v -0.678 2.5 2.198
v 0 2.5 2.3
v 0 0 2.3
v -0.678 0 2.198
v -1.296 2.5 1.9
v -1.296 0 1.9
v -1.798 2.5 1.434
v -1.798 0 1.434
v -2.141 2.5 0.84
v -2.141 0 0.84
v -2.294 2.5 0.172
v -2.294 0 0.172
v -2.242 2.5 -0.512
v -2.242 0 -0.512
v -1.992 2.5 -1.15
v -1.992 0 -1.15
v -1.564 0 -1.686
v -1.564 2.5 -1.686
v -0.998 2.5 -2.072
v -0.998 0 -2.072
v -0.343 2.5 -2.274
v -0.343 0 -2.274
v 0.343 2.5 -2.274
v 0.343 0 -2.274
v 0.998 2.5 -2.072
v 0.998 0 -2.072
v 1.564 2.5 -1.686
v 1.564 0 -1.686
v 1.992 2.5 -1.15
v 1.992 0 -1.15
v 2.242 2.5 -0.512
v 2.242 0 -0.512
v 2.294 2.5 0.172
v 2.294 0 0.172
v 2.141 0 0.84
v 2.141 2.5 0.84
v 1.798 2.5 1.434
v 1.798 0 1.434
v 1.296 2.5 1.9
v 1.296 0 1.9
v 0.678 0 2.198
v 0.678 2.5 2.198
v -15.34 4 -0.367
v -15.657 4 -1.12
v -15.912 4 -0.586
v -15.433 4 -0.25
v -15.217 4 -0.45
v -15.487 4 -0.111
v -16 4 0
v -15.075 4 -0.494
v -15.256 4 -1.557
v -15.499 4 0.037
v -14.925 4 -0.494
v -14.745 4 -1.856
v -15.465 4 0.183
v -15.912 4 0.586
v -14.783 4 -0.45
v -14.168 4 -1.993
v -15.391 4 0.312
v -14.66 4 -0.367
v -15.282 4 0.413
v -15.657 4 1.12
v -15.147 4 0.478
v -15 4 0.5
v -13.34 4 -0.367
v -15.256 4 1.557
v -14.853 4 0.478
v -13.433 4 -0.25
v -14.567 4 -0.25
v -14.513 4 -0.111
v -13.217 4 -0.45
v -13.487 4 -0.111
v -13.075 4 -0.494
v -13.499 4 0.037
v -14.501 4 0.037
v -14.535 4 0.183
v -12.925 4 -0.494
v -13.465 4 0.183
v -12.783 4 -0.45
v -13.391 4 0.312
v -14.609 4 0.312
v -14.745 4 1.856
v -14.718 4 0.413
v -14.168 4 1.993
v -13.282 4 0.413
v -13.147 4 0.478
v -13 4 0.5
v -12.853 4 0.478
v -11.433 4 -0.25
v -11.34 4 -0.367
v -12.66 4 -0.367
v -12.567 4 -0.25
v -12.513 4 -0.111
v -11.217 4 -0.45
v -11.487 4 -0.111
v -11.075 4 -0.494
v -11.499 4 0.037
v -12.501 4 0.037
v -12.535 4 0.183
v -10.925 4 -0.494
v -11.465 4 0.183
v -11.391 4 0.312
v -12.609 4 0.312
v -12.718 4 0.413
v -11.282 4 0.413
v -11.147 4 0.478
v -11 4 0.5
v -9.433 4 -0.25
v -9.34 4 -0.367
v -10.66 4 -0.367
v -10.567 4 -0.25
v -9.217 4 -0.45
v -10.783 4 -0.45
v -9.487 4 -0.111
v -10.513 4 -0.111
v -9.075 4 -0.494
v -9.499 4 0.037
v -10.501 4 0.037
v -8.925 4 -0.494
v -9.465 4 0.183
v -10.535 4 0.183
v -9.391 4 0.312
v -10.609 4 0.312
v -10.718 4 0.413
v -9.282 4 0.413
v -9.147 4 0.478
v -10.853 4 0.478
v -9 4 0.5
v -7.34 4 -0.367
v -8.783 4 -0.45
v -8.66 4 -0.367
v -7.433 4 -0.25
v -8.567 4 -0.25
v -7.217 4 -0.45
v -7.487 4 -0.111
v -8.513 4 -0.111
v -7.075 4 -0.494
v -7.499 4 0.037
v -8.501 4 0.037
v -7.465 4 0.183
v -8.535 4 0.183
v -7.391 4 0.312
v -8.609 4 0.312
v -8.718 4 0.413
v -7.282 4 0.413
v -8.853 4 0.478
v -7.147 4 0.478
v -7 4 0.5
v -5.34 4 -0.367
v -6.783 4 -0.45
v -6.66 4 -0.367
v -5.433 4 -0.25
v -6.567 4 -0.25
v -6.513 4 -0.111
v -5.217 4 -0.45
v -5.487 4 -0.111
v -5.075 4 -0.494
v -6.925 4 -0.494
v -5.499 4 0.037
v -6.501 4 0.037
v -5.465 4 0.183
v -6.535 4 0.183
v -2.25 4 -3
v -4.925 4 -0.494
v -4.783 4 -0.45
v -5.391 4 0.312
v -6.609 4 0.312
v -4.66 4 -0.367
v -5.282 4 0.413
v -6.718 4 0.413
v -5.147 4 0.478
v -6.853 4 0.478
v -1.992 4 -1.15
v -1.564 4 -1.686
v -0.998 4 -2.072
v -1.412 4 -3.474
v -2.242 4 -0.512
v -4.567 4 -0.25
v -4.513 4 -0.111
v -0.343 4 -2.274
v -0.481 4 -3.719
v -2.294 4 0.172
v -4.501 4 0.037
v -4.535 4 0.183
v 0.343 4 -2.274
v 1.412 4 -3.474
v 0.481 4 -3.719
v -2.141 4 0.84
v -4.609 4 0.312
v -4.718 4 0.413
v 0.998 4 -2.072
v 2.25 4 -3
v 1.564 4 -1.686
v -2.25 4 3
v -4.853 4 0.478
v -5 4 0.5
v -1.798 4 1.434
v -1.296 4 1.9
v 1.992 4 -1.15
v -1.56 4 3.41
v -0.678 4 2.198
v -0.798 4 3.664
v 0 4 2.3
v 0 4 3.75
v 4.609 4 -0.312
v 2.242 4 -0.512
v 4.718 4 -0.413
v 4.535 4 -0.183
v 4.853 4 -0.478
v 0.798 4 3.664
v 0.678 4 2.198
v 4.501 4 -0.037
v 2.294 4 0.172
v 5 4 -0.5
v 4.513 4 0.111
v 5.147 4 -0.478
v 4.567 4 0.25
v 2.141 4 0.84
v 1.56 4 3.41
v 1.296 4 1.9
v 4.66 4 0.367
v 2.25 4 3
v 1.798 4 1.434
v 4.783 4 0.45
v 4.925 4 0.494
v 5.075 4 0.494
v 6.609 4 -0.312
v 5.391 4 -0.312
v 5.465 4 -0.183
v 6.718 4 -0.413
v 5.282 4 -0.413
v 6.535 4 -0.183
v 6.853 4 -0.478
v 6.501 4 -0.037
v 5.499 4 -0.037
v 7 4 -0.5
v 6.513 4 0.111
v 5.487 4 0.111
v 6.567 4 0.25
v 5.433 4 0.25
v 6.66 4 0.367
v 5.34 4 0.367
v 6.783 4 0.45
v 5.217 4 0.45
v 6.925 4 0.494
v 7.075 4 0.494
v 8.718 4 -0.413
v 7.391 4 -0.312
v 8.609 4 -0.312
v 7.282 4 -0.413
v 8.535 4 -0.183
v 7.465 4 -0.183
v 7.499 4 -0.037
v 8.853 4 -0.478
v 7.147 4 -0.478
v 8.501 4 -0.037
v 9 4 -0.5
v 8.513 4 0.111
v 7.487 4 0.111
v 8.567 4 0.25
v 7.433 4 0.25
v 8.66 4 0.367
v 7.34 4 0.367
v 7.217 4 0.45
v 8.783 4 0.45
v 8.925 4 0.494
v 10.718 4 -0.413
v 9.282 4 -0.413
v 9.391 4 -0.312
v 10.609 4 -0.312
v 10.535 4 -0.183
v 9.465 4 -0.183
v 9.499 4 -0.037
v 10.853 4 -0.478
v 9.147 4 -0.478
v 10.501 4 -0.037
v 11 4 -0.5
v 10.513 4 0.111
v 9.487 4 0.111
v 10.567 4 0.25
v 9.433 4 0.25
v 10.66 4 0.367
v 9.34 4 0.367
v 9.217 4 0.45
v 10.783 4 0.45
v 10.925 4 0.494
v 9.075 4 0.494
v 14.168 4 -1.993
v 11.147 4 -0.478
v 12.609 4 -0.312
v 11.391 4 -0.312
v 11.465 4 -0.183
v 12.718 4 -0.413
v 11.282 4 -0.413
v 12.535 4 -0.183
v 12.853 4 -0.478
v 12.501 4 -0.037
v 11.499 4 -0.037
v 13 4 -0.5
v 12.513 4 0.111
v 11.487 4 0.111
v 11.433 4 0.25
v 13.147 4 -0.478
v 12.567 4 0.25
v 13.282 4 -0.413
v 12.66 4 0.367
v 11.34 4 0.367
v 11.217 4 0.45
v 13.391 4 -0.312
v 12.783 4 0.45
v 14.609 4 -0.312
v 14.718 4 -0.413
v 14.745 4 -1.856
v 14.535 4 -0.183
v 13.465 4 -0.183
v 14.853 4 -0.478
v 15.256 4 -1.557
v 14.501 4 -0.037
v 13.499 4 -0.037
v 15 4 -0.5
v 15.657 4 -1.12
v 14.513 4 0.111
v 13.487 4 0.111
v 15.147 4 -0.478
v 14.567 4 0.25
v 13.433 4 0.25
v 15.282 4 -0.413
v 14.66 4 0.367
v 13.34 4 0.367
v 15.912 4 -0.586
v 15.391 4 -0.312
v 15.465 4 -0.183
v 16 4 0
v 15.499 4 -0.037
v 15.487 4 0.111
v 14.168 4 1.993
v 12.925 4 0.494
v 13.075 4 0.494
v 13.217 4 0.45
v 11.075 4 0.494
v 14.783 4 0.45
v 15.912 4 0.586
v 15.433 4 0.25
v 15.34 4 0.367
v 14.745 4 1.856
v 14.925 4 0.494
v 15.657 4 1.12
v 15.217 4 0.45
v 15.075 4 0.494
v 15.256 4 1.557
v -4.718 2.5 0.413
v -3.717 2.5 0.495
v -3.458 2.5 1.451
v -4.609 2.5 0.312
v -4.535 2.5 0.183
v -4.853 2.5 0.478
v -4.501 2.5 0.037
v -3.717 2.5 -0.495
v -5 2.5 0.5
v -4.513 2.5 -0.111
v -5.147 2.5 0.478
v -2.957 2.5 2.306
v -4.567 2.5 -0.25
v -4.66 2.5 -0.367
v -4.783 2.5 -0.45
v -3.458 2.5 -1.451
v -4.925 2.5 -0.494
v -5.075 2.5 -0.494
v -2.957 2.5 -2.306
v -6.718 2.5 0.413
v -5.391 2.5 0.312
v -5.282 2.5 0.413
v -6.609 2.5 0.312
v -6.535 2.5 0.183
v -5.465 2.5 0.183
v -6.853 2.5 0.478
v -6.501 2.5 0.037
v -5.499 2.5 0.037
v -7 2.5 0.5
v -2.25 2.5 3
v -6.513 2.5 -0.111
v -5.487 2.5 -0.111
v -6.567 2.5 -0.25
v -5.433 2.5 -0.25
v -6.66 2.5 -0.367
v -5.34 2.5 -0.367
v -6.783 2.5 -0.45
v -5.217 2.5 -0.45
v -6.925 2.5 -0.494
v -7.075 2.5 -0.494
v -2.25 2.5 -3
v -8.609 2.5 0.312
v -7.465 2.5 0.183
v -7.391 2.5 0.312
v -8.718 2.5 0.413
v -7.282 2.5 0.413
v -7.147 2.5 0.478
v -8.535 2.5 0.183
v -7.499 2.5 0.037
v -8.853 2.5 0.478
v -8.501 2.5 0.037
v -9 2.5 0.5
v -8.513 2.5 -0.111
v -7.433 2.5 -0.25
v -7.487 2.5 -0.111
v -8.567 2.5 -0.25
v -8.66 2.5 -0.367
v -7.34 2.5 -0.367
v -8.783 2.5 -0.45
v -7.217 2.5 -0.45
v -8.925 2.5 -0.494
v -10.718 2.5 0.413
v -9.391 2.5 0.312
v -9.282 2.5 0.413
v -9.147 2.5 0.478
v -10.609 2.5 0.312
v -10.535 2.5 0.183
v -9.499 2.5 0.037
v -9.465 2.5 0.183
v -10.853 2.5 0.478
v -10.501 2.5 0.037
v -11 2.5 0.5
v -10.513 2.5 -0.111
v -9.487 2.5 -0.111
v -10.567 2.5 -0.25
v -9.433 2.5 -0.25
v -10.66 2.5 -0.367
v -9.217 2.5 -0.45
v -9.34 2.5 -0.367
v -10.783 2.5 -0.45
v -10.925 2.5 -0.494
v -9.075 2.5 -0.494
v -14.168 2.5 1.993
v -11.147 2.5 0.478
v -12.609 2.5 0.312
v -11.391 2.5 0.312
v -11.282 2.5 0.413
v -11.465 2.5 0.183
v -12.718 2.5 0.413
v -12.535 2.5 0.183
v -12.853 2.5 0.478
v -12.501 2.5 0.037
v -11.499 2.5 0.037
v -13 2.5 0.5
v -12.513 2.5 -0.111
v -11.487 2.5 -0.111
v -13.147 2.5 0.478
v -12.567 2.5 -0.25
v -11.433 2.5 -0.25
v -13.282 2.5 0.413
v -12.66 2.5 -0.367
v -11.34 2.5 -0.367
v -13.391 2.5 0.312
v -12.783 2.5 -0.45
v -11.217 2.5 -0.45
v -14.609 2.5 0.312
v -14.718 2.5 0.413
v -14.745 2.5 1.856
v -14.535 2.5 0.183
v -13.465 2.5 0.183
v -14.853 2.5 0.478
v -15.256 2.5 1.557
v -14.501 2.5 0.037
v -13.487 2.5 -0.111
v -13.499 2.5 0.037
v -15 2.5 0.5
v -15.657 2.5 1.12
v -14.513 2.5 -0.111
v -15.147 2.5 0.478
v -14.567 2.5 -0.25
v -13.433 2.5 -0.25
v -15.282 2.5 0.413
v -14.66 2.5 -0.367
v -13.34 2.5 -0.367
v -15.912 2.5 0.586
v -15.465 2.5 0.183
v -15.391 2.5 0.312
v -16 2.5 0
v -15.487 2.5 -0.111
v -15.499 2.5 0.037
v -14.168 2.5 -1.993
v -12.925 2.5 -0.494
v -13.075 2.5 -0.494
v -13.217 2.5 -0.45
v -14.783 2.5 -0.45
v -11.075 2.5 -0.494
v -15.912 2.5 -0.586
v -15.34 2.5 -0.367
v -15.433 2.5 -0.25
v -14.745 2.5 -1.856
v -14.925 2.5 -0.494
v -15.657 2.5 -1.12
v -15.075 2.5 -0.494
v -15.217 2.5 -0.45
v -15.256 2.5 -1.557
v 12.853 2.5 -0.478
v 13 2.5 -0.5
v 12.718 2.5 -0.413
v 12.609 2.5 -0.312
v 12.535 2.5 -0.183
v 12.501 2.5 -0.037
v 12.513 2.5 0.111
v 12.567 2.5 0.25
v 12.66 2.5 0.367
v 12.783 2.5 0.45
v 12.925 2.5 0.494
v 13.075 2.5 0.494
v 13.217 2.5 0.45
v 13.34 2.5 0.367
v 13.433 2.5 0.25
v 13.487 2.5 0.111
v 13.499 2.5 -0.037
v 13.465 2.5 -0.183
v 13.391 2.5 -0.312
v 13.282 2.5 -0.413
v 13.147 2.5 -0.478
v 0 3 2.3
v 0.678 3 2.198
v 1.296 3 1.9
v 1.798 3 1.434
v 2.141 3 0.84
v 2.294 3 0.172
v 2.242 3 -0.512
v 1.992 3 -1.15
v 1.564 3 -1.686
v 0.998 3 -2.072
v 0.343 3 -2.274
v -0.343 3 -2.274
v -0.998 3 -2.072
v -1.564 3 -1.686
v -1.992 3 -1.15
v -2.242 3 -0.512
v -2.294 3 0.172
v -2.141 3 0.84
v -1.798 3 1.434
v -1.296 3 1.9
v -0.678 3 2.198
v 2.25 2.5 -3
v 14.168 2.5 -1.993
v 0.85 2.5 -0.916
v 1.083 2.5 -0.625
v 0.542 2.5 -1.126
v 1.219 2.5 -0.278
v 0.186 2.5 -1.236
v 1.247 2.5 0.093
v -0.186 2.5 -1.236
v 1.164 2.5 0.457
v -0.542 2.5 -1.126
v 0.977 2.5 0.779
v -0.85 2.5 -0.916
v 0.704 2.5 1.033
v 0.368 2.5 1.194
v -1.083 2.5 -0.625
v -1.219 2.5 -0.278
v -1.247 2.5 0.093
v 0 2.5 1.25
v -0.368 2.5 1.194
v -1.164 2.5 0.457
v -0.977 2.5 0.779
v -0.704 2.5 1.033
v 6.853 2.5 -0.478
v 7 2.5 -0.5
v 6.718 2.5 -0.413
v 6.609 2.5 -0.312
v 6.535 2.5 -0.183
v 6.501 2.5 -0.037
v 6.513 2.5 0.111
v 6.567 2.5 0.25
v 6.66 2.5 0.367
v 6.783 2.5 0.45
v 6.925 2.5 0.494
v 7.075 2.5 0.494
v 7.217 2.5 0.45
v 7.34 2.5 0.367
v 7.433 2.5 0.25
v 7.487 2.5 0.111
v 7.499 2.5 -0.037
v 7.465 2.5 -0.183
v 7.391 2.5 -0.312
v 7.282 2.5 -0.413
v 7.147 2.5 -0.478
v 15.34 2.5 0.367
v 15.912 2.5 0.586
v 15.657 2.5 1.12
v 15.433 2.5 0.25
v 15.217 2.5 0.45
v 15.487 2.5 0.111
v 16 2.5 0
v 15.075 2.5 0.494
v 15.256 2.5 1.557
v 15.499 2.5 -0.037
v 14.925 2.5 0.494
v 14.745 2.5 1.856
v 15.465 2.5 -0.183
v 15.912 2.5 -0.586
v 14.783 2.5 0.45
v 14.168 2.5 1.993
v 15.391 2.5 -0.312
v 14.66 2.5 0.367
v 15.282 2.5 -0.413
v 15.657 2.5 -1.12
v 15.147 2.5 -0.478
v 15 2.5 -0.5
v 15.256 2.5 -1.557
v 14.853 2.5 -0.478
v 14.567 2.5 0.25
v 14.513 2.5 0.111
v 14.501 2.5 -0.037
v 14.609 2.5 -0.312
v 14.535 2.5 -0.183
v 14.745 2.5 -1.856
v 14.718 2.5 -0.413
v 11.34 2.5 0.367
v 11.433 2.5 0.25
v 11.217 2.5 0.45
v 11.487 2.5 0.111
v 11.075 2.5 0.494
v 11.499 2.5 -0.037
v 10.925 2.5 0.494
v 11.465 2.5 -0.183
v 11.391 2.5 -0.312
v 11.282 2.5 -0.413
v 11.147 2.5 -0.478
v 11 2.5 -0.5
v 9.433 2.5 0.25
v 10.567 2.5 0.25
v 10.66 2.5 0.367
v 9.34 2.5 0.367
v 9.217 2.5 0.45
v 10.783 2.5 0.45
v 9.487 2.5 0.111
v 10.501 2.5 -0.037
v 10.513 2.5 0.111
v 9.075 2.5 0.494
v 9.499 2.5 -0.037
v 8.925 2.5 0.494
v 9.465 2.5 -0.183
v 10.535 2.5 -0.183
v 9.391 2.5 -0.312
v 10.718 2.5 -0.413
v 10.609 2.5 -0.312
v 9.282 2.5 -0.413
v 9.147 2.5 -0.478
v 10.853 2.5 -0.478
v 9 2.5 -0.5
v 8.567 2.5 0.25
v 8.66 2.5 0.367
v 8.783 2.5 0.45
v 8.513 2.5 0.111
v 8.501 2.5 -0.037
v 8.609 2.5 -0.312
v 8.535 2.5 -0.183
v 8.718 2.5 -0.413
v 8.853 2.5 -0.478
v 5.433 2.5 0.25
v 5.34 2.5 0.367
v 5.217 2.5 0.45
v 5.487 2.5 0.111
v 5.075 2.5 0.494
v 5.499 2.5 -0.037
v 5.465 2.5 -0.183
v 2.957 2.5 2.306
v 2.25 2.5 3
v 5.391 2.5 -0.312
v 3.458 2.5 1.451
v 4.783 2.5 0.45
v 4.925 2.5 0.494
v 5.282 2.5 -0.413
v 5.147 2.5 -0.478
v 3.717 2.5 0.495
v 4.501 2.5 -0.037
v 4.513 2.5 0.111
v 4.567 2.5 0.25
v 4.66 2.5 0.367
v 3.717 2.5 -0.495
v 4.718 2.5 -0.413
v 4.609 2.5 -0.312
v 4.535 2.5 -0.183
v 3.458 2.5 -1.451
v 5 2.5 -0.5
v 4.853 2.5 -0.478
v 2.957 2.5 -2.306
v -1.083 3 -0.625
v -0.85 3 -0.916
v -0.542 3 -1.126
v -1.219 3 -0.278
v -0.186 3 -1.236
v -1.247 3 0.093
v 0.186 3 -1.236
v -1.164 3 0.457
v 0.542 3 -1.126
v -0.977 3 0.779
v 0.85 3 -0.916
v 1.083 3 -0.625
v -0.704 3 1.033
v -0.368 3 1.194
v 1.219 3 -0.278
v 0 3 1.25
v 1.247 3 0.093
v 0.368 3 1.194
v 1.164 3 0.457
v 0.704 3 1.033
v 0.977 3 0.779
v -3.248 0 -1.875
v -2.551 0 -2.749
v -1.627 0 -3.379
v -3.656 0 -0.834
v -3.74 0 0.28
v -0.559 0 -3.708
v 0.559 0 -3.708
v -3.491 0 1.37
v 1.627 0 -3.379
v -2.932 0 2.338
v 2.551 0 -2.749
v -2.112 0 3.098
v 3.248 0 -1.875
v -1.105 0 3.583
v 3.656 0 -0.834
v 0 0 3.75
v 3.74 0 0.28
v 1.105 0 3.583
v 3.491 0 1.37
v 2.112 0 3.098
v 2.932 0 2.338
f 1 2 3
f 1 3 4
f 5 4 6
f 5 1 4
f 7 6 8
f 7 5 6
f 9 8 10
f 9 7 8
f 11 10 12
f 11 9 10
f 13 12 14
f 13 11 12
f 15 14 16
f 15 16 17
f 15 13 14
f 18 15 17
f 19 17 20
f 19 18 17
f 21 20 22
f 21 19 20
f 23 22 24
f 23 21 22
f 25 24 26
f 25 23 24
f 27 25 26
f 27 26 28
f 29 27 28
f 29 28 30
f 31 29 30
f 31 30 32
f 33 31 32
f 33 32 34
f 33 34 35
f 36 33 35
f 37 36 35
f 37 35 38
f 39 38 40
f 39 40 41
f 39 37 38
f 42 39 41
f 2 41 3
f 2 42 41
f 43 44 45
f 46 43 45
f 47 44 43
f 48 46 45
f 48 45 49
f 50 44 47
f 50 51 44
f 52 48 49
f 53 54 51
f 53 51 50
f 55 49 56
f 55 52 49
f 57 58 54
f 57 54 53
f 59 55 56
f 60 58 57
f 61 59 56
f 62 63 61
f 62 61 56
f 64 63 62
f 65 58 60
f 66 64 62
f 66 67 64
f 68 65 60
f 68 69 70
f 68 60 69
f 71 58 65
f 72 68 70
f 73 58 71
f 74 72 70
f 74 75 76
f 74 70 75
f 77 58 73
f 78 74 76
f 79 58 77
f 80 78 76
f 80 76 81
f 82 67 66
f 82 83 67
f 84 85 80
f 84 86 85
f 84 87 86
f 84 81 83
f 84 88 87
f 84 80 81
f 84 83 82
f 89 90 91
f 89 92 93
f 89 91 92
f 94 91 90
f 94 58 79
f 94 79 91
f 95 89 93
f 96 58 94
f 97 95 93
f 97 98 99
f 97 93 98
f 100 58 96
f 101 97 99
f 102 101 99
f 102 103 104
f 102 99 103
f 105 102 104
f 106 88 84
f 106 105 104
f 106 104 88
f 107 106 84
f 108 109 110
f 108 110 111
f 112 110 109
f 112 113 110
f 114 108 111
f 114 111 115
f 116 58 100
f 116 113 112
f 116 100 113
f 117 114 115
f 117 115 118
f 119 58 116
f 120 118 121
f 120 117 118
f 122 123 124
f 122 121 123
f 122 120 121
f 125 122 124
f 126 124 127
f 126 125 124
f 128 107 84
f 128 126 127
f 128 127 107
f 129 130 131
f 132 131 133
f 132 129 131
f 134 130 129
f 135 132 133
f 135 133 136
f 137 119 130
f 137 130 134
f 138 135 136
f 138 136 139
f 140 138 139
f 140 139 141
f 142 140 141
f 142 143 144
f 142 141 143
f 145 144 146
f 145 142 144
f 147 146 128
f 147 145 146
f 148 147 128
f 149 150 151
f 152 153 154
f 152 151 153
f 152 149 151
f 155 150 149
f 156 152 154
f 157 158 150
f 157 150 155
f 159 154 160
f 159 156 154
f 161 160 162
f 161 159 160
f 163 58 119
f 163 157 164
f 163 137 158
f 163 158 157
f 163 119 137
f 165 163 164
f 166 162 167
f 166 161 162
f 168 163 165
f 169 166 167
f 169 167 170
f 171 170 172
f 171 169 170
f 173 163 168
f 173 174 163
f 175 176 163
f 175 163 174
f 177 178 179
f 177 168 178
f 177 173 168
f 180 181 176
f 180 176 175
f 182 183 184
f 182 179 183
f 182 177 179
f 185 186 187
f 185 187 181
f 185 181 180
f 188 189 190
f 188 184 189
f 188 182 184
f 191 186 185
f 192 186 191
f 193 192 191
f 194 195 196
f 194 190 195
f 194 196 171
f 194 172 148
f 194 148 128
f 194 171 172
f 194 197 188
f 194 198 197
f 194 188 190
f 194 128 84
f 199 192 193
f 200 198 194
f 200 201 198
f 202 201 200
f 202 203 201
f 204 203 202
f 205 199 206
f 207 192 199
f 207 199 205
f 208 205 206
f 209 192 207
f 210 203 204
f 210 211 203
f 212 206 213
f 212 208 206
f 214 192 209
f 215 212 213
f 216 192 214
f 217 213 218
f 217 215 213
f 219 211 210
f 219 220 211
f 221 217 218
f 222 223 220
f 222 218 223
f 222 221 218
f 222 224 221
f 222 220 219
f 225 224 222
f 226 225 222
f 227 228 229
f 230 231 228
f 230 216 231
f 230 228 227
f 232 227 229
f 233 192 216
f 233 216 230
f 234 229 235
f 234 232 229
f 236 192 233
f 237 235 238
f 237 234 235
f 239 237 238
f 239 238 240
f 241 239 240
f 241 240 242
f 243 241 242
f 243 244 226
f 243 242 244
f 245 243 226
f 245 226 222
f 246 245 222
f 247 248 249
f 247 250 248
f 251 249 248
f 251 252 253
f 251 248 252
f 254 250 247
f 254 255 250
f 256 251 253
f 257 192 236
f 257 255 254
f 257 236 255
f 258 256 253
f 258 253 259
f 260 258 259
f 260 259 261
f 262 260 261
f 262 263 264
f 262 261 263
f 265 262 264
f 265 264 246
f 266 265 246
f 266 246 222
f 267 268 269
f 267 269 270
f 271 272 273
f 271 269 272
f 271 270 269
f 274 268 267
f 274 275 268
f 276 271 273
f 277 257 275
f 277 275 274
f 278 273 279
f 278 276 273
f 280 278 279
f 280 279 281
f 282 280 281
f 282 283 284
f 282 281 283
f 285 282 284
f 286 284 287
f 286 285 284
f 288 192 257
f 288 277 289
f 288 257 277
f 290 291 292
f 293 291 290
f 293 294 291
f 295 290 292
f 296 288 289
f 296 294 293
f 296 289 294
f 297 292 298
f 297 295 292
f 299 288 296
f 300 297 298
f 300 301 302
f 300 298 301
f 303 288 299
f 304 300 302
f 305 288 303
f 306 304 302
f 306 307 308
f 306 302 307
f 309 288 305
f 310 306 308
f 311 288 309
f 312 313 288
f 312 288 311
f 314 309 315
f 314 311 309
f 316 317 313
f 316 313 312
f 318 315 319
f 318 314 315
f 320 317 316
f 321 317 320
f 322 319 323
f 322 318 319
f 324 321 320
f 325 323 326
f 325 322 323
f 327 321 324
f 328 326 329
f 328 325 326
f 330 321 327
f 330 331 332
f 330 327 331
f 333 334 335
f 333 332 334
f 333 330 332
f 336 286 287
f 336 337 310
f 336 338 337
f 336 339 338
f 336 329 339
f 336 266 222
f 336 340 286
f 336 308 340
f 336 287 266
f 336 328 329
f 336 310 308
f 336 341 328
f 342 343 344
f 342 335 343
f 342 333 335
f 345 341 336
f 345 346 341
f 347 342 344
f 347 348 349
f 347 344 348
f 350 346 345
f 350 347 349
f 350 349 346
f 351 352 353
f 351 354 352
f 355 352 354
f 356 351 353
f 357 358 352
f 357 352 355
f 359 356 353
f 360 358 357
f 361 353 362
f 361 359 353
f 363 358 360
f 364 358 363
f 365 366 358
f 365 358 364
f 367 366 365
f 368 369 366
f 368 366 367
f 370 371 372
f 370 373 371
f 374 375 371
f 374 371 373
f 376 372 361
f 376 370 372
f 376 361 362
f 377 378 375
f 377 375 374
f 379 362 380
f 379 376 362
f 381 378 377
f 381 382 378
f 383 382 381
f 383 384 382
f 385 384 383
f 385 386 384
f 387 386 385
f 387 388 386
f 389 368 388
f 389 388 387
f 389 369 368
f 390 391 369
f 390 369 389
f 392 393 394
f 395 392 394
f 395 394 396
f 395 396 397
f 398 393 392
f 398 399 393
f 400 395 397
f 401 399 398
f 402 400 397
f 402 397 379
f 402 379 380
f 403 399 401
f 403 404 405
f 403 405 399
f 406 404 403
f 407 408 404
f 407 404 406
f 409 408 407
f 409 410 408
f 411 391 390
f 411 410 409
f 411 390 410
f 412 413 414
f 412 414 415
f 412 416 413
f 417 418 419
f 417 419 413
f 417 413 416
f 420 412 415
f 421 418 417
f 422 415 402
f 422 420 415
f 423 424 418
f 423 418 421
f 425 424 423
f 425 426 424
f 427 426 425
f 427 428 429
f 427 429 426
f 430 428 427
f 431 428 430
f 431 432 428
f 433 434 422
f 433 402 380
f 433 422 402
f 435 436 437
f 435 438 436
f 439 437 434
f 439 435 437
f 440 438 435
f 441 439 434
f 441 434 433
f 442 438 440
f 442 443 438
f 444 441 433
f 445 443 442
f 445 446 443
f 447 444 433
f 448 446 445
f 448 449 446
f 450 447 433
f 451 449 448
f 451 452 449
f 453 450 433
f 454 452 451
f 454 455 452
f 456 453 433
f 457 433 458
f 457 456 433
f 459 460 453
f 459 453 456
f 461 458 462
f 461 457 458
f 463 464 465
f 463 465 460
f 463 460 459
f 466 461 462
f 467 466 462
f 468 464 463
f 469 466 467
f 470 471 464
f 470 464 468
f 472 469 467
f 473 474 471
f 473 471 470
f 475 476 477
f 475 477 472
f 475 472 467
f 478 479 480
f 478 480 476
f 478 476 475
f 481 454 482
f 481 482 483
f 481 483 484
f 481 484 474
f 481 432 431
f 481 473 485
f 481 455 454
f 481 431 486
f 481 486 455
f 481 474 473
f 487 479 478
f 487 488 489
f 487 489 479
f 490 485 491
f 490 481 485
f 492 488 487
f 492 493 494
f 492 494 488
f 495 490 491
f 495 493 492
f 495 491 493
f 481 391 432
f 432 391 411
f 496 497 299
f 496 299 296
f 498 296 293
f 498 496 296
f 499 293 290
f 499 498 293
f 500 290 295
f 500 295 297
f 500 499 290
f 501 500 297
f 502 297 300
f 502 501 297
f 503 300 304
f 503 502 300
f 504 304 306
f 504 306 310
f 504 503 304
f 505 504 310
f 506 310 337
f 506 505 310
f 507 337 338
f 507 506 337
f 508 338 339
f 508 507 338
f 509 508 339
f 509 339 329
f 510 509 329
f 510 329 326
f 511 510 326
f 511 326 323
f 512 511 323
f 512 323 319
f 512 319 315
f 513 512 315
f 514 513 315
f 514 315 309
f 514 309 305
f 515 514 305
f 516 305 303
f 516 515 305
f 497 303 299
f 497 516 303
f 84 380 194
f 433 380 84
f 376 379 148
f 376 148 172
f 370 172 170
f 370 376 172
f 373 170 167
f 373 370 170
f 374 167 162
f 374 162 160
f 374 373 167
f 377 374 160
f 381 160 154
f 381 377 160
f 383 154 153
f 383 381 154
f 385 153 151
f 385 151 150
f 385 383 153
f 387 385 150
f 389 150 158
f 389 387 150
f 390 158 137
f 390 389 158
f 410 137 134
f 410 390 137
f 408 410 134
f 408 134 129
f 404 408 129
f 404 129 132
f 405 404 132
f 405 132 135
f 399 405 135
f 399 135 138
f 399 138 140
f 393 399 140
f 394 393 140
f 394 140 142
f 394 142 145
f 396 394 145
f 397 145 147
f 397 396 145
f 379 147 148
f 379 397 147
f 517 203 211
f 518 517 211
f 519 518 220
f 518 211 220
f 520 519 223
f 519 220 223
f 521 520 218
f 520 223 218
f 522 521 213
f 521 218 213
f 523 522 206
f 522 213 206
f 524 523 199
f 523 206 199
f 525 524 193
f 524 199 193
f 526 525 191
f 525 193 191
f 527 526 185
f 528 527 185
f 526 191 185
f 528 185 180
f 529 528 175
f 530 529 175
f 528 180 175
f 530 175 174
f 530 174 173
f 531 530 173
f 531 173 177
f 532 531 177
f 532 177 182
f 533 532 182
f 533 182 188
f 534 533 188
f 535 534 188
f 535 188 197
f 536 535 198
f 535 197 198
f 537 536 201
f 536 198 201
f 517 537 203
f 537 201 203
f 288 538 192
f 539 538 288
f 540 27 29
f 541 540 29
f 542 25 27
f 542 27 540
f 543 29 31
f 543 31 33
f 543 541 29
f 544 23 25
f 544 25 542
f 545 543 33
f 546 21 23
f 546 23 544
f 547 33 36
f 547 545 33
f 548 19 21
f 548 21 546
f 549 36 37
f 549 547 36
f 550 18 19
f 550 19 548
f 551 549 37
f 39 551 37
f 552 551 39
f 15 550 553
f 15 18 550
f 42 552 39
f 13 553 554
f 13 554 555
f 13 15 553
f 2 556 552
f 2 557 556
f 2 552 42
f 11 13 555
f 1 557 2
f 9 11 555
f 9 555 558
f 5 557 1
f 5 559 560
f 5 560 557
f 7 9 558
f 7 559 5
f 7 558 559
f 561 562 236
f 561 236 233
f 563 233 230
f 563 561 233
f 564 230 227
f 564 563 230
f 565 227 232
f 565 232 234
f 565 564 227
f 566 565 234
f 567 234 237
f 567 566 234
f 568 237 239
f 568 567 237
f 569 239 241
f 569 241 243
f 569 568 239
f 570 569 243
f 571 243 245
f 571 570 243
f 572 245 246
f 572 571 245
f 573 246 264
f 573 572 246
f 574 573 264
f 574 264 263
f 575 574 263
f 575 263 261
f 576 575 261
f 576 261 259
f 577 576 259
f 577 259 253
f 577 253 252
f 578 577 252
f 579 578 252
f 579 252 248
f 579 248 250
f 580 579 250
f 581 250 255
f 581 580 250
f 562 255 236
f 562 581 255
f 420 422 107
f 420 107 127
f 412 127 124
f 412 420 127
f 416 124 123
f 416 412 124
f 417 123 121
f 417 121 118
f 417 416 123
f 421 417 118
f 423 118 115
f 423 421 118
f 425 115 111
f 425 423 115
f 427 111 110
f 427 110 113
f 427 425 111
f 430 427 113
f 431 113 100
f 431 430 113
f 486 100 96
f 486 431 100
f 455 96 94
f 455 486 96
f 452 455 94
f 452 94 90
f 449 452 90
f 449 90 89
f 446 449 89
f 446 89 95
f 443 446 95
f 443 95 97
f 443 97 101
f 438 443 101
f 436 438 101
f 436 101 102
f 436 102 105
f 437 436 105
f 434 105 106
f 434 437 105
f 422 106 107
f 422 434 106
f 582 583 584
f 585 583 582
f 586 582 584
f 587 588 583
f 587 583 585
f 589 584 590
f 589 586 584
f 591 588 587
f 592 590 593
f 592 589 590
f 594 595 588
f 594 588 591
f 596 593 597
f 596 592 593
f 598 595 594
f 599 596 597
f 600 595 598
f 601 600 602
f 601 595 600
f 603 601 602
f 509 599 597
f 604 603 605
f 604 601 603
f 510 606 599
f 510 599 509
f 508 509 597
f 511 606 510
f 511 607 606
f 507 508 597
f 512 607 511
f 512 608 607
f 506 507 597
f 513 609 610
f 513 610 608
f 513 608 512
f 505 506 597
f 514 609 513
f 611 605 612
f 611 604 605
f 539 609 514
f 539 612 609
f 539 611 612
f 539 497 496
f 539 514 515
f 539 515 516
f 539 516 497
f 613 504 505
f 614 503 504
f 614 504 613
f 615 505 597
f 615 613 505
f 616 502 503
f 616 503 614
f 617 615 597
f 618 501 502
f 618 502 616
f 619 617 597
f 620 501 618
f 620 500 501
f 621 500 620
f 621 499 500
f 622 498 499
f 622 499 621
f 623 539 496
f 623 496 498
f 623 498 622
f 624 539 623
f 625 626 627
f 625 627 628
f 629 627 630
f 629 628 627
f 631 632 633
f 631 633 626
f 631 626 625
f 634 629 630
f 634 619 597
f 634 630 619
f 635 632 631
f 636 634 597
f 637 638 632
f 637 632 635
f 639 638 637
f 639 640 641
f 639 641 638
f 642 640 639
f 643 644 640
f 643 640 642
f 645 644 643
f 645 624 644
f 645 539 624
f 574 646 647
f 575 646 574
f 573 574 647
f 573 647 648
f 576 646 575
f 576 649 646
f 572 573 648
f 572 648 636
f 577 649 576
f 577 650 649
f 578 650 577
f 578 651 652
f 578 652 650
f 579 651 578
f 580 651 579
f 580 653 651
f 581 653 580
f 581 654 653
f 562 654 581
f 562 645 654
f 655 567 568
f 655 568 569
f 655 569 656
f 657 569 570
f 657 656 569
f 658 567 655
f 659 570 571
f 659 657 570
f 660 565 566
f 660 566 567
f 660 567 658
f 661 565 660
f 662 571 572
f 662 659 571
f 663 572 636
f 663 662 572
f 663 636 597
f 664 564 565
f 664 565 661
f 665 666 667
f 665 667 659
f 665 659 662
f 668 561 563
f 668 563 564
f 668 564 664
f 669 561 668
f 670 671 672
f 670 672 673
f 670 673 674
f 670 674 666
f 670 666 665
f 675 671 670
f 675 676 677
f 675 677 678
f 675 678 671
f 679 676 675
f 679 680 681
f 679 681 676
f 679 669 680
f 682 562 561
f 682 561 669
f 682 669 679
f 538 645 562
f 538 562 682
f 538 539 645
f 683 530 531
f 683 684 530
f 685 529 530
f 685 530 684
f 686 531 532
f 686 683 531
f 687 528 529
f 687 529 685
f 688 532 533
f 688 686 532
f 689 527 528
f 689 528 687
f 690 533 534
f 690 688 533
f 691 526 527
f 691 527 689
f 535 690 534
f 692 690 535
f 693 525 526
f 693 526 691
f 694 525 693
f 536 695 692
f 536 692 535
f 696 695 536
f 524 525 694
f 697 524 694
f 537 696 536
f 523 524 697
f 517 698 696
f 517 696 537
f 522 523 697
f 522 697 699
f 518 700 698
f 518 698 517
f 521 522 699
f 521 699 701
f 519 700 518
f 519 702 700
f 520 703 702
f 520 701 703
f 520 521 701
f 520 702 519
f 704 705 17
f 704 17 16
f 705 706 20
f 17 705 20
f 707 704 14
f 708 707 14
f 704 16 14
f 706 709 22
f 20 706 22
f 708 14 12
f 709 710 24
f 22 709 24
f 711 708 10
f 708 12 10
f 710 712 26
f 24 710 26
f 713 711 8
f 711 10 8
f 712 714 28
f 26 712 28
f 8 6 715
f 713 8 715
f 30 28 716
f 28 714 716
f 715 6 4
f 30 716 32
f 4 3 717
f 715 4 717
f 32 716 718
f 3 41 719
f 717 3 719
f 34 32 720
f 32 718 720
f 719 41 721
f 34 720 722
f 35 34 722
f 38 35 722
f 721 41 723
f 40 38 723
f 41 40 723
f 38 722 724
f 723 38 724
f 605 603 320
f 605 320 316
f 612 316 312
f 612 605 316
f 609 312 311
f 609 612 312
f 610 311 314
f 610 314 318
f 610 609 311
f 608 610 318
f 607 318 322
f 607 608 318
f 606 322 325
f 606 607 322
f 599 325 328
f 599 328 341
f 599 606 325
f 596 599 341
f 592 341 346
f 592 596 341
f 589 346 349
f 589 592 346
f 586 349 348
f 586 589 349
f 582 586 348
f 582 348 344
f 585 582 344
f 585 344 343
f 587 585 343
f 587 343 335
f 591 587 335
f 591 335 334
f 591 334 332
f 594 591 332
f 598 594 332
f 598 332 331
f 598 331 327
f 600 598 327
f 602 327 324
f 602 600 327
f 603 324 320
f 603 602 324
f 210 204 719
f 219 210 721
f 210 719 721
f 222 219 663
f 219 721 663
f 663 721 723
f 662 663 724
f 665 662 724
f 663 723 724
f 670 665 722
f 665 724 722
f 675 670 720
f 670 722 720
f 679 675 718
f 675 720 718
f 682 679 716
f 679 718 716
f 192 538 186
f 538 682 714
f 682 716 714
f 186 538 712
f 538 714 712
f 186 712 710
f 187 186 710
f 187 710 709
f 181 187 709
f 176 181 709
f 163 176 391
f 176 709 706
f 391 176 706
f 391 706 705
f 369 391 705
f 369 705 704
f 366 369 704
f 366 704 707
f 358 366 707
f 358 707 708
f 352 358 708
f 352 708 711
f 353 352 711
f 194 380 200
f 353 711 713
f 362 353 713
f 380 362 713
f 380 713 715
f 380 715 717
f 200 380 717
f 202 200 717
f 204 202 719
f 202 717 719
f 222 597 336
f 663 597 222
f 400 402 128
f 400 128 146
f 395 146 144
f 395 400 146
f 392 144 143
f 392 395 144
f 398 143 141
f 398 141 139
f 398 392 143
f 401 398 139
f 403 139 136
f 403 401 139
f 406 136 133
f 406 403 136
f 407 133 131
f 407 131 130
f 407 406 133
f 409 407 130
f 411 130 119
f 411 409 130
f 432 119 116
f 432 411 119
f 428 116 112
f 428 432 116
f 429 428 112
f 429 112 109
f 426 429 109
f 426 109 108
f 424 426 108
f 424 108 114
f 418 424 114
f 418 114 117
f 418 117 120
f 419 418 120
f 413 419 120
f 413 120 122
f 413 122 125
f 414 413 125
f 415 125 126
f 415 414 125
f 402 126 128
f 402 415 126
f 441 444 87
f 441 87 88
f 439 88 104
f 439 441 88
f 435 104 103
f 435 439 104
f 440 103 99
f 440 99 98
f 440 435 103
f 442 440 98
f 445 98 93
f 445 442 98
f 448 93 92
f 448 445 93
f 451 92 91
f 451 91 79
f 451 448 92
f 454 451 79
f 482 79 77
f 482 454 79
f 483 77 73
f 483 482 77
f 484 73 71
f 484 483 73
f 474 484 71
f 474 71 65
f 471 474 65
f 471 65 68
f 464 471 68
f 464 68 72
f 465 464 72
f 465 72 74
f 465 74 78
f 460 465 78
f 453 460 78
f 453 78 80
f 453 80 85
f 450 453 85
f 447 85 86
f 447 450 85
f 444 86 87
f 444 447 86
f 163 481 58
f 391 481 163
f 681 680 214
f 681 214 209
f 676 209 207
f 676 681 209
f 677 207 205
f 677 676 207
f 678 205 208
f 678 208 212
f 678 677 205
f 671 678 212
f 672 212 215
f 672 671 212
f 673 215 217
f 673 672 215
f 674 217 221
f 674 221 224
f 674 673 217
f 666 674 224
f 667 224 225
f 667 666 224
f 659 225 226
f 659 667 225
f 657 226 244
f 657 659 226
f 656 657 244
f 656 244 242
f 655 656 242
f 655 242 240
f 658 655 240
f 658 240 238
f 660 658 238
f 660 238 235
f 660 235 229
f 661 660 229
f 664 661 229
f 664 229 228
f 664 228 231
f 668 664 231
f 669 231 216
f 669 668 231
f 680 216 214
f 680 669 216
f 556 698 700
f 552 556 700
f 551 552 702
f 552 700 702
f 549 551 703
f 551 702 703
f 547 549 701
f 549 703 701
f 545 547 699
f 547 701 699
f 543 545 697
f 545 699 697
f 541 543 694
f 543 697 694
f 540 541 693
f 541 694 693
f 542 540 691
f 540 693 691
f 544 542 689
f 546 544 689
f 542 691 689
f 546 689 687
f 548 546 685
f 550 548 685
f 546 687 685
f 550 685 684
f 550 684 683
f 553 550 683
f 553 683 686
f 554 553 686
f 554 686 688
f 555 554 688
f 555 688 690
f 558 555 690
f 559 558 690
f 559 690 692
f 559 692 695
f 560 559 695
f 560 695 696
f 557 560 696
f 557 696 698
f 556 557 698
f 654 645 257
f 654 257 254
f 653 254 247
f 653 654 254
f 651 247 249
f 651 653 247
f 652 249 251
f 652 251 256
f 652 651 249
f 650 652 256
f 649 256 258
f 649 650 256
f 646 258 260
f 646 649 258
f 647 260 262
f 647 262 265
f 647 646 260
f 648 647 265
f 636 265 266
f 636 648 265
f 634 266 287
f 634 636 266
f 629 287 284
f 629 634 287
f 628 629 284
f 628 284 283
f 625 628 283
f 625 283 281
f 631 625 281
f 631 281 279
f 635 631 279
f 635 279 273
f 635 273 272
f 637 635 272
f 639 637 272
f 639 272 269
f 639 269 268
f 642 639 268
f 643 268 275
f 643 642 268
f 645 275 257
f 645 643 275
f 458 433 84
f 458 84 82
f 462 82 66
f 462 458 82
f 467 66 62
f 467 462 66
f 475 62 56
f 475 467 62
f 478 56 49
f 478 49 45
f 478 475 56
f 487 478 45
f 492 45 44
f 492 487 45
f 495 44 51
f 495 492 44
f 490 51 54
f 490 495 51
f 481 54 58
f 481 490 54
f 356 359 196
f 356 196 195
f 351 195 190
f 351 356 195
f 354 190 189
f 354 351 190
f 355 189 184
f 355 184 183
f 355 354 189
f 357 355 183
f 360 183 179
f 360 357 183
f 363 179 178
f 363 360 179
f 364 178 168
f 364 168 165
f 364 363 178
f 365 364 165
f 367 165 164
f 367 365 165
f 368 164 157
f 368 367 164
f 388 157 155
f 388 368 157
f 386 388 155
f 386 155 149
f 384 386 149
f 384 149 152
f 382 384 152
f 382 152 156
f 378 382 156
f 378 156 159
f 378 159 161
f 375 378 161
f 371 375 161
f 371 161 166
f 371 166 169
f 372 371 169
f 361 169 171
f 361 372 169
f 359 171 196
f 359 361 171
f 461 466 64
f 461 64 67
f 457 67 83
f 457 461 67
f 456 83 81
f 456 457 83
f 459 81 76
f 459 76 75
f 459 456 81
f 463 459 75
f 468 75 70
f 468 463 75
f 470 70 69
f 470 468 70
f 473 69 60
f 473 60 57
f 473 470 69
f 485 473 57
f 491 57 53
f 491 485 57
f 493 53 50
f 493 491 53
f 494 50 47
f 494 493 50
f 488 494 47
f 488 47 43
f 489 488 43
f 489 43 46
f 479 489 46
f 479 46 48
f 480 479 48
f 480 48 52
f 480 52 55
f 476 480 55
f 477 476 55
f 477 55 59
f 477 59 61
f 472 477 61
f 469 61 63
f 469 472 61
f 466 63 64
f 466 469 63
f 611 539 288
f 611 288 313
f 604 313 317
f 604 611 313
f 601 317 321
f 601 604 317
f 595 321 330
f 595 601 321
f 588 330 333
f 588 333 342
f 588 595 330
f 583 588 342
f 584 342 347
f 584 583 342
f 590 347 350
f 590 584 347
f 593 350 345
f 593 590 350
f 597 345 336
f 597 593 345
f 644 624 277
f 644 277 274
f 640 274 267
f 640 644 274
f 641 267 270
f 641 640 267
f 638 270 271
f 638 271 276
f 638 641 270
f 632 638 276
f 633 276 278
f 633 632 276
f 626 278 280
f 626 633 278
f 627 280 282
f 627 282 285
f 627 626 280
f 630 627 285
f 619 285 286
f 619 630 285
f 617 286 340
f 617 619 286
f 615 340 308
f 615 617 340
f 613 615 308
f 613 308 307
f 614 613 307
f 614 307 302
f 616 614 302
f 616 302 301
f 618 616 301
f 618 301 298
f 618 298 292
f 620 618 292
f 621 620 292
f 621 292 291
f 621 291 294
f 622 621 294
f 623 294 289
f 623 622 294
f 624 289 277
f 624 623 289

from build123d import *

# Parameters (mm, degrees)
SKETCH1_R           = 3.75
BOSS_EXTRUDE1_DEPTH = 4
SKETCH2_R           = 2.3
CUT_EXTRUDE1_DEPTH  = 1
BOSS_EXTRUDE2_START = -1.5
SKETCH3_R           = 0.5
BOSS_EXTRUDE2_DEPTH = 1.5
SKETCH4_R           = 1.25
CUT_EXTRUDE2_DEPTH  = 4.5
CUT_EXTRUDE3_START  = -2.5
SKETCH5_R           = 2.3
CUT_EXTRUDE3_DEPTH  = 2.5


with BuildPart() as part:
    # Sketch1 → Boss-Extrude1 (new body)
    with BuildSketch(Plane(origin=(0, 0, 0), x_dir=(1, 0, 0), z_dir=(0, 1, 0))):
        with Locations(Location((0, 0, 0), (0, 0, 270))):
            Circle(SKETCH1_R)
    extrude(amount=BOSS_EXTRUDE1_DEPTH)

    # Sketch2 → Cut-Extrude1 (cut)
    with BuildSketch(Plane(origin=(0, 4, 0), x_dir=(1, 0, 0), z_dir=(0, 1, 0))):
        with Locations(Location((0, 0, 0), (0, 0, 270))):
            Circle(SKETCH2_R)
    extrude(amount=-CUT_EXTRUDE1_DEPTH, mode=Mode.SUBTRACT)

    # Sketch3 → Boss-Extrude2 (add)
    # profile 1 of 2: a face of its own
    with BuildSketch(Plane(origin=(0, 4, 0), x_dir=(1, 0, 0), z_dir=(0, 1, 0)).offset(BOSS_EXTRUDE2_START)):
        with BuildLine():
            Line((-14.168399438, 1.992897797), (-2.25, 3))
            ThreePointArc((-2.25, 3), (-3.75, 0), (-2.25, -3))
            Line((-2.25, -3), (-14.168399438, -1.992897797))
            ThreePointArc((-14.168399438, -1.992897797), (-16, 0), (-14.168399438, 1.992897797))
        make_face()
        with Locations(Location((-15, 0, 0), (0, 0, 270))):
            Circle(SKETCH3_R, mode=Mode.SUBTRACT)
        with Locations(Location((-13, 0, 0), (0, 0, 270))):
            Circle(SKETCH3_R, mode=Mode.SUBTRACT)
        with Locations(Location((-11, 0, 0), (0, 0, 270))):
            Circle(SKETCH3_R, mode=Mode.SUBTRACT)
        with Locations(Location((-9, 0, 0), (0, 0, 270))):
            Circle(SKETCH3_R, mode=Mode.SUBTRACT)
        with Locations(Location((-7, 0, 0), (0, 0, 270))):
            Circle(SKETCH3_R, mode=Mode.SUBTRACT)
        with Locations(Location((-5, 0, 0), (0, 0, 270))):
            Circle(SKETCH3_R, mode=Mode.SUBTRACT)
    # profile 2 of 2: a face of its own
    with BuildSketch(Plane(origin=(0, 4, 0), x_dir=(1, 0, 0), z_dir=(0, 1, 0)).offset(BOSS_EXTRUDE2_START)):
        with BuildLine():
            Line((14.168399438, -1.992897797), (2.25, -3))
            ThreePointArc((2.25, -3), (3.75, 0), (2.25, 3))
            Line((2.25, 3), (14.168399438, 1.992897797))
            ThreePointArc((14.168399438, 1.992897797), (16, 0), (14.168399438, -1.992897797))
        make_face()
        with Locations(Location((15, 0, 0), (0, 0, 90))):
            Circle(SKETCH3_R, mode=Mode.SUBTRACT)
        with Locations(Location((5, 0, 0), (0, 0, 90))):
            Circle(SKETCH3_R, mode=Mode.SUBTRACT)
        with Locations(Location((7, 0, 0), (0, 0, 90))):
            Circle(SKETCH3_R, mode=Mode.SUBTRACT)
        with Locations(Location((9, 0, 0), (0, 0, 90))):
            Circle(SKETCH3_R, mode=Mode.SUBTRACT)
        with Locations(Location((11, 0, 0), (0, 0, 90))):
            Circle(SKETCH3_R, mode=Mode.SUBTRACT)
        with Locations(Location((13, 0, 0), (0, 0, 90))):
            Circle(SKETCH3_R, mode=Mode.SUBTRACT)
    extrude(amount=BOSS_EXTRUDE2_DEPTH)

    # Sketch4 → Cut-Extrude2 (cut)
    with BuildSketch(Plane(origin=(0, 3, 0), x_dir=(1, 0, 0), z_dir=(0, 1, 0))):
        with Locations(Location((0, 0, 0), (0, 0, 270))):
            Circle(SKETCH4_R)
    extrude(amount=-CUT_EXTRUDE2_DEPTH, mode=Mode.SUBTRACT)

    # Sketch5 → Cut-Extrude3 (cut)
    with BuildSketch(Plane.XZ.offset(CUT_EXTRUDE3_START)):
        with Locations(Location((0, 0, 0), (0, 0, 90))):
            Circle(SKETCH5_R)
    extrude(amount=CUT_EXTRUDE3_DEPTH, mode=Mode.SUBTRACT)


solid = part.part
